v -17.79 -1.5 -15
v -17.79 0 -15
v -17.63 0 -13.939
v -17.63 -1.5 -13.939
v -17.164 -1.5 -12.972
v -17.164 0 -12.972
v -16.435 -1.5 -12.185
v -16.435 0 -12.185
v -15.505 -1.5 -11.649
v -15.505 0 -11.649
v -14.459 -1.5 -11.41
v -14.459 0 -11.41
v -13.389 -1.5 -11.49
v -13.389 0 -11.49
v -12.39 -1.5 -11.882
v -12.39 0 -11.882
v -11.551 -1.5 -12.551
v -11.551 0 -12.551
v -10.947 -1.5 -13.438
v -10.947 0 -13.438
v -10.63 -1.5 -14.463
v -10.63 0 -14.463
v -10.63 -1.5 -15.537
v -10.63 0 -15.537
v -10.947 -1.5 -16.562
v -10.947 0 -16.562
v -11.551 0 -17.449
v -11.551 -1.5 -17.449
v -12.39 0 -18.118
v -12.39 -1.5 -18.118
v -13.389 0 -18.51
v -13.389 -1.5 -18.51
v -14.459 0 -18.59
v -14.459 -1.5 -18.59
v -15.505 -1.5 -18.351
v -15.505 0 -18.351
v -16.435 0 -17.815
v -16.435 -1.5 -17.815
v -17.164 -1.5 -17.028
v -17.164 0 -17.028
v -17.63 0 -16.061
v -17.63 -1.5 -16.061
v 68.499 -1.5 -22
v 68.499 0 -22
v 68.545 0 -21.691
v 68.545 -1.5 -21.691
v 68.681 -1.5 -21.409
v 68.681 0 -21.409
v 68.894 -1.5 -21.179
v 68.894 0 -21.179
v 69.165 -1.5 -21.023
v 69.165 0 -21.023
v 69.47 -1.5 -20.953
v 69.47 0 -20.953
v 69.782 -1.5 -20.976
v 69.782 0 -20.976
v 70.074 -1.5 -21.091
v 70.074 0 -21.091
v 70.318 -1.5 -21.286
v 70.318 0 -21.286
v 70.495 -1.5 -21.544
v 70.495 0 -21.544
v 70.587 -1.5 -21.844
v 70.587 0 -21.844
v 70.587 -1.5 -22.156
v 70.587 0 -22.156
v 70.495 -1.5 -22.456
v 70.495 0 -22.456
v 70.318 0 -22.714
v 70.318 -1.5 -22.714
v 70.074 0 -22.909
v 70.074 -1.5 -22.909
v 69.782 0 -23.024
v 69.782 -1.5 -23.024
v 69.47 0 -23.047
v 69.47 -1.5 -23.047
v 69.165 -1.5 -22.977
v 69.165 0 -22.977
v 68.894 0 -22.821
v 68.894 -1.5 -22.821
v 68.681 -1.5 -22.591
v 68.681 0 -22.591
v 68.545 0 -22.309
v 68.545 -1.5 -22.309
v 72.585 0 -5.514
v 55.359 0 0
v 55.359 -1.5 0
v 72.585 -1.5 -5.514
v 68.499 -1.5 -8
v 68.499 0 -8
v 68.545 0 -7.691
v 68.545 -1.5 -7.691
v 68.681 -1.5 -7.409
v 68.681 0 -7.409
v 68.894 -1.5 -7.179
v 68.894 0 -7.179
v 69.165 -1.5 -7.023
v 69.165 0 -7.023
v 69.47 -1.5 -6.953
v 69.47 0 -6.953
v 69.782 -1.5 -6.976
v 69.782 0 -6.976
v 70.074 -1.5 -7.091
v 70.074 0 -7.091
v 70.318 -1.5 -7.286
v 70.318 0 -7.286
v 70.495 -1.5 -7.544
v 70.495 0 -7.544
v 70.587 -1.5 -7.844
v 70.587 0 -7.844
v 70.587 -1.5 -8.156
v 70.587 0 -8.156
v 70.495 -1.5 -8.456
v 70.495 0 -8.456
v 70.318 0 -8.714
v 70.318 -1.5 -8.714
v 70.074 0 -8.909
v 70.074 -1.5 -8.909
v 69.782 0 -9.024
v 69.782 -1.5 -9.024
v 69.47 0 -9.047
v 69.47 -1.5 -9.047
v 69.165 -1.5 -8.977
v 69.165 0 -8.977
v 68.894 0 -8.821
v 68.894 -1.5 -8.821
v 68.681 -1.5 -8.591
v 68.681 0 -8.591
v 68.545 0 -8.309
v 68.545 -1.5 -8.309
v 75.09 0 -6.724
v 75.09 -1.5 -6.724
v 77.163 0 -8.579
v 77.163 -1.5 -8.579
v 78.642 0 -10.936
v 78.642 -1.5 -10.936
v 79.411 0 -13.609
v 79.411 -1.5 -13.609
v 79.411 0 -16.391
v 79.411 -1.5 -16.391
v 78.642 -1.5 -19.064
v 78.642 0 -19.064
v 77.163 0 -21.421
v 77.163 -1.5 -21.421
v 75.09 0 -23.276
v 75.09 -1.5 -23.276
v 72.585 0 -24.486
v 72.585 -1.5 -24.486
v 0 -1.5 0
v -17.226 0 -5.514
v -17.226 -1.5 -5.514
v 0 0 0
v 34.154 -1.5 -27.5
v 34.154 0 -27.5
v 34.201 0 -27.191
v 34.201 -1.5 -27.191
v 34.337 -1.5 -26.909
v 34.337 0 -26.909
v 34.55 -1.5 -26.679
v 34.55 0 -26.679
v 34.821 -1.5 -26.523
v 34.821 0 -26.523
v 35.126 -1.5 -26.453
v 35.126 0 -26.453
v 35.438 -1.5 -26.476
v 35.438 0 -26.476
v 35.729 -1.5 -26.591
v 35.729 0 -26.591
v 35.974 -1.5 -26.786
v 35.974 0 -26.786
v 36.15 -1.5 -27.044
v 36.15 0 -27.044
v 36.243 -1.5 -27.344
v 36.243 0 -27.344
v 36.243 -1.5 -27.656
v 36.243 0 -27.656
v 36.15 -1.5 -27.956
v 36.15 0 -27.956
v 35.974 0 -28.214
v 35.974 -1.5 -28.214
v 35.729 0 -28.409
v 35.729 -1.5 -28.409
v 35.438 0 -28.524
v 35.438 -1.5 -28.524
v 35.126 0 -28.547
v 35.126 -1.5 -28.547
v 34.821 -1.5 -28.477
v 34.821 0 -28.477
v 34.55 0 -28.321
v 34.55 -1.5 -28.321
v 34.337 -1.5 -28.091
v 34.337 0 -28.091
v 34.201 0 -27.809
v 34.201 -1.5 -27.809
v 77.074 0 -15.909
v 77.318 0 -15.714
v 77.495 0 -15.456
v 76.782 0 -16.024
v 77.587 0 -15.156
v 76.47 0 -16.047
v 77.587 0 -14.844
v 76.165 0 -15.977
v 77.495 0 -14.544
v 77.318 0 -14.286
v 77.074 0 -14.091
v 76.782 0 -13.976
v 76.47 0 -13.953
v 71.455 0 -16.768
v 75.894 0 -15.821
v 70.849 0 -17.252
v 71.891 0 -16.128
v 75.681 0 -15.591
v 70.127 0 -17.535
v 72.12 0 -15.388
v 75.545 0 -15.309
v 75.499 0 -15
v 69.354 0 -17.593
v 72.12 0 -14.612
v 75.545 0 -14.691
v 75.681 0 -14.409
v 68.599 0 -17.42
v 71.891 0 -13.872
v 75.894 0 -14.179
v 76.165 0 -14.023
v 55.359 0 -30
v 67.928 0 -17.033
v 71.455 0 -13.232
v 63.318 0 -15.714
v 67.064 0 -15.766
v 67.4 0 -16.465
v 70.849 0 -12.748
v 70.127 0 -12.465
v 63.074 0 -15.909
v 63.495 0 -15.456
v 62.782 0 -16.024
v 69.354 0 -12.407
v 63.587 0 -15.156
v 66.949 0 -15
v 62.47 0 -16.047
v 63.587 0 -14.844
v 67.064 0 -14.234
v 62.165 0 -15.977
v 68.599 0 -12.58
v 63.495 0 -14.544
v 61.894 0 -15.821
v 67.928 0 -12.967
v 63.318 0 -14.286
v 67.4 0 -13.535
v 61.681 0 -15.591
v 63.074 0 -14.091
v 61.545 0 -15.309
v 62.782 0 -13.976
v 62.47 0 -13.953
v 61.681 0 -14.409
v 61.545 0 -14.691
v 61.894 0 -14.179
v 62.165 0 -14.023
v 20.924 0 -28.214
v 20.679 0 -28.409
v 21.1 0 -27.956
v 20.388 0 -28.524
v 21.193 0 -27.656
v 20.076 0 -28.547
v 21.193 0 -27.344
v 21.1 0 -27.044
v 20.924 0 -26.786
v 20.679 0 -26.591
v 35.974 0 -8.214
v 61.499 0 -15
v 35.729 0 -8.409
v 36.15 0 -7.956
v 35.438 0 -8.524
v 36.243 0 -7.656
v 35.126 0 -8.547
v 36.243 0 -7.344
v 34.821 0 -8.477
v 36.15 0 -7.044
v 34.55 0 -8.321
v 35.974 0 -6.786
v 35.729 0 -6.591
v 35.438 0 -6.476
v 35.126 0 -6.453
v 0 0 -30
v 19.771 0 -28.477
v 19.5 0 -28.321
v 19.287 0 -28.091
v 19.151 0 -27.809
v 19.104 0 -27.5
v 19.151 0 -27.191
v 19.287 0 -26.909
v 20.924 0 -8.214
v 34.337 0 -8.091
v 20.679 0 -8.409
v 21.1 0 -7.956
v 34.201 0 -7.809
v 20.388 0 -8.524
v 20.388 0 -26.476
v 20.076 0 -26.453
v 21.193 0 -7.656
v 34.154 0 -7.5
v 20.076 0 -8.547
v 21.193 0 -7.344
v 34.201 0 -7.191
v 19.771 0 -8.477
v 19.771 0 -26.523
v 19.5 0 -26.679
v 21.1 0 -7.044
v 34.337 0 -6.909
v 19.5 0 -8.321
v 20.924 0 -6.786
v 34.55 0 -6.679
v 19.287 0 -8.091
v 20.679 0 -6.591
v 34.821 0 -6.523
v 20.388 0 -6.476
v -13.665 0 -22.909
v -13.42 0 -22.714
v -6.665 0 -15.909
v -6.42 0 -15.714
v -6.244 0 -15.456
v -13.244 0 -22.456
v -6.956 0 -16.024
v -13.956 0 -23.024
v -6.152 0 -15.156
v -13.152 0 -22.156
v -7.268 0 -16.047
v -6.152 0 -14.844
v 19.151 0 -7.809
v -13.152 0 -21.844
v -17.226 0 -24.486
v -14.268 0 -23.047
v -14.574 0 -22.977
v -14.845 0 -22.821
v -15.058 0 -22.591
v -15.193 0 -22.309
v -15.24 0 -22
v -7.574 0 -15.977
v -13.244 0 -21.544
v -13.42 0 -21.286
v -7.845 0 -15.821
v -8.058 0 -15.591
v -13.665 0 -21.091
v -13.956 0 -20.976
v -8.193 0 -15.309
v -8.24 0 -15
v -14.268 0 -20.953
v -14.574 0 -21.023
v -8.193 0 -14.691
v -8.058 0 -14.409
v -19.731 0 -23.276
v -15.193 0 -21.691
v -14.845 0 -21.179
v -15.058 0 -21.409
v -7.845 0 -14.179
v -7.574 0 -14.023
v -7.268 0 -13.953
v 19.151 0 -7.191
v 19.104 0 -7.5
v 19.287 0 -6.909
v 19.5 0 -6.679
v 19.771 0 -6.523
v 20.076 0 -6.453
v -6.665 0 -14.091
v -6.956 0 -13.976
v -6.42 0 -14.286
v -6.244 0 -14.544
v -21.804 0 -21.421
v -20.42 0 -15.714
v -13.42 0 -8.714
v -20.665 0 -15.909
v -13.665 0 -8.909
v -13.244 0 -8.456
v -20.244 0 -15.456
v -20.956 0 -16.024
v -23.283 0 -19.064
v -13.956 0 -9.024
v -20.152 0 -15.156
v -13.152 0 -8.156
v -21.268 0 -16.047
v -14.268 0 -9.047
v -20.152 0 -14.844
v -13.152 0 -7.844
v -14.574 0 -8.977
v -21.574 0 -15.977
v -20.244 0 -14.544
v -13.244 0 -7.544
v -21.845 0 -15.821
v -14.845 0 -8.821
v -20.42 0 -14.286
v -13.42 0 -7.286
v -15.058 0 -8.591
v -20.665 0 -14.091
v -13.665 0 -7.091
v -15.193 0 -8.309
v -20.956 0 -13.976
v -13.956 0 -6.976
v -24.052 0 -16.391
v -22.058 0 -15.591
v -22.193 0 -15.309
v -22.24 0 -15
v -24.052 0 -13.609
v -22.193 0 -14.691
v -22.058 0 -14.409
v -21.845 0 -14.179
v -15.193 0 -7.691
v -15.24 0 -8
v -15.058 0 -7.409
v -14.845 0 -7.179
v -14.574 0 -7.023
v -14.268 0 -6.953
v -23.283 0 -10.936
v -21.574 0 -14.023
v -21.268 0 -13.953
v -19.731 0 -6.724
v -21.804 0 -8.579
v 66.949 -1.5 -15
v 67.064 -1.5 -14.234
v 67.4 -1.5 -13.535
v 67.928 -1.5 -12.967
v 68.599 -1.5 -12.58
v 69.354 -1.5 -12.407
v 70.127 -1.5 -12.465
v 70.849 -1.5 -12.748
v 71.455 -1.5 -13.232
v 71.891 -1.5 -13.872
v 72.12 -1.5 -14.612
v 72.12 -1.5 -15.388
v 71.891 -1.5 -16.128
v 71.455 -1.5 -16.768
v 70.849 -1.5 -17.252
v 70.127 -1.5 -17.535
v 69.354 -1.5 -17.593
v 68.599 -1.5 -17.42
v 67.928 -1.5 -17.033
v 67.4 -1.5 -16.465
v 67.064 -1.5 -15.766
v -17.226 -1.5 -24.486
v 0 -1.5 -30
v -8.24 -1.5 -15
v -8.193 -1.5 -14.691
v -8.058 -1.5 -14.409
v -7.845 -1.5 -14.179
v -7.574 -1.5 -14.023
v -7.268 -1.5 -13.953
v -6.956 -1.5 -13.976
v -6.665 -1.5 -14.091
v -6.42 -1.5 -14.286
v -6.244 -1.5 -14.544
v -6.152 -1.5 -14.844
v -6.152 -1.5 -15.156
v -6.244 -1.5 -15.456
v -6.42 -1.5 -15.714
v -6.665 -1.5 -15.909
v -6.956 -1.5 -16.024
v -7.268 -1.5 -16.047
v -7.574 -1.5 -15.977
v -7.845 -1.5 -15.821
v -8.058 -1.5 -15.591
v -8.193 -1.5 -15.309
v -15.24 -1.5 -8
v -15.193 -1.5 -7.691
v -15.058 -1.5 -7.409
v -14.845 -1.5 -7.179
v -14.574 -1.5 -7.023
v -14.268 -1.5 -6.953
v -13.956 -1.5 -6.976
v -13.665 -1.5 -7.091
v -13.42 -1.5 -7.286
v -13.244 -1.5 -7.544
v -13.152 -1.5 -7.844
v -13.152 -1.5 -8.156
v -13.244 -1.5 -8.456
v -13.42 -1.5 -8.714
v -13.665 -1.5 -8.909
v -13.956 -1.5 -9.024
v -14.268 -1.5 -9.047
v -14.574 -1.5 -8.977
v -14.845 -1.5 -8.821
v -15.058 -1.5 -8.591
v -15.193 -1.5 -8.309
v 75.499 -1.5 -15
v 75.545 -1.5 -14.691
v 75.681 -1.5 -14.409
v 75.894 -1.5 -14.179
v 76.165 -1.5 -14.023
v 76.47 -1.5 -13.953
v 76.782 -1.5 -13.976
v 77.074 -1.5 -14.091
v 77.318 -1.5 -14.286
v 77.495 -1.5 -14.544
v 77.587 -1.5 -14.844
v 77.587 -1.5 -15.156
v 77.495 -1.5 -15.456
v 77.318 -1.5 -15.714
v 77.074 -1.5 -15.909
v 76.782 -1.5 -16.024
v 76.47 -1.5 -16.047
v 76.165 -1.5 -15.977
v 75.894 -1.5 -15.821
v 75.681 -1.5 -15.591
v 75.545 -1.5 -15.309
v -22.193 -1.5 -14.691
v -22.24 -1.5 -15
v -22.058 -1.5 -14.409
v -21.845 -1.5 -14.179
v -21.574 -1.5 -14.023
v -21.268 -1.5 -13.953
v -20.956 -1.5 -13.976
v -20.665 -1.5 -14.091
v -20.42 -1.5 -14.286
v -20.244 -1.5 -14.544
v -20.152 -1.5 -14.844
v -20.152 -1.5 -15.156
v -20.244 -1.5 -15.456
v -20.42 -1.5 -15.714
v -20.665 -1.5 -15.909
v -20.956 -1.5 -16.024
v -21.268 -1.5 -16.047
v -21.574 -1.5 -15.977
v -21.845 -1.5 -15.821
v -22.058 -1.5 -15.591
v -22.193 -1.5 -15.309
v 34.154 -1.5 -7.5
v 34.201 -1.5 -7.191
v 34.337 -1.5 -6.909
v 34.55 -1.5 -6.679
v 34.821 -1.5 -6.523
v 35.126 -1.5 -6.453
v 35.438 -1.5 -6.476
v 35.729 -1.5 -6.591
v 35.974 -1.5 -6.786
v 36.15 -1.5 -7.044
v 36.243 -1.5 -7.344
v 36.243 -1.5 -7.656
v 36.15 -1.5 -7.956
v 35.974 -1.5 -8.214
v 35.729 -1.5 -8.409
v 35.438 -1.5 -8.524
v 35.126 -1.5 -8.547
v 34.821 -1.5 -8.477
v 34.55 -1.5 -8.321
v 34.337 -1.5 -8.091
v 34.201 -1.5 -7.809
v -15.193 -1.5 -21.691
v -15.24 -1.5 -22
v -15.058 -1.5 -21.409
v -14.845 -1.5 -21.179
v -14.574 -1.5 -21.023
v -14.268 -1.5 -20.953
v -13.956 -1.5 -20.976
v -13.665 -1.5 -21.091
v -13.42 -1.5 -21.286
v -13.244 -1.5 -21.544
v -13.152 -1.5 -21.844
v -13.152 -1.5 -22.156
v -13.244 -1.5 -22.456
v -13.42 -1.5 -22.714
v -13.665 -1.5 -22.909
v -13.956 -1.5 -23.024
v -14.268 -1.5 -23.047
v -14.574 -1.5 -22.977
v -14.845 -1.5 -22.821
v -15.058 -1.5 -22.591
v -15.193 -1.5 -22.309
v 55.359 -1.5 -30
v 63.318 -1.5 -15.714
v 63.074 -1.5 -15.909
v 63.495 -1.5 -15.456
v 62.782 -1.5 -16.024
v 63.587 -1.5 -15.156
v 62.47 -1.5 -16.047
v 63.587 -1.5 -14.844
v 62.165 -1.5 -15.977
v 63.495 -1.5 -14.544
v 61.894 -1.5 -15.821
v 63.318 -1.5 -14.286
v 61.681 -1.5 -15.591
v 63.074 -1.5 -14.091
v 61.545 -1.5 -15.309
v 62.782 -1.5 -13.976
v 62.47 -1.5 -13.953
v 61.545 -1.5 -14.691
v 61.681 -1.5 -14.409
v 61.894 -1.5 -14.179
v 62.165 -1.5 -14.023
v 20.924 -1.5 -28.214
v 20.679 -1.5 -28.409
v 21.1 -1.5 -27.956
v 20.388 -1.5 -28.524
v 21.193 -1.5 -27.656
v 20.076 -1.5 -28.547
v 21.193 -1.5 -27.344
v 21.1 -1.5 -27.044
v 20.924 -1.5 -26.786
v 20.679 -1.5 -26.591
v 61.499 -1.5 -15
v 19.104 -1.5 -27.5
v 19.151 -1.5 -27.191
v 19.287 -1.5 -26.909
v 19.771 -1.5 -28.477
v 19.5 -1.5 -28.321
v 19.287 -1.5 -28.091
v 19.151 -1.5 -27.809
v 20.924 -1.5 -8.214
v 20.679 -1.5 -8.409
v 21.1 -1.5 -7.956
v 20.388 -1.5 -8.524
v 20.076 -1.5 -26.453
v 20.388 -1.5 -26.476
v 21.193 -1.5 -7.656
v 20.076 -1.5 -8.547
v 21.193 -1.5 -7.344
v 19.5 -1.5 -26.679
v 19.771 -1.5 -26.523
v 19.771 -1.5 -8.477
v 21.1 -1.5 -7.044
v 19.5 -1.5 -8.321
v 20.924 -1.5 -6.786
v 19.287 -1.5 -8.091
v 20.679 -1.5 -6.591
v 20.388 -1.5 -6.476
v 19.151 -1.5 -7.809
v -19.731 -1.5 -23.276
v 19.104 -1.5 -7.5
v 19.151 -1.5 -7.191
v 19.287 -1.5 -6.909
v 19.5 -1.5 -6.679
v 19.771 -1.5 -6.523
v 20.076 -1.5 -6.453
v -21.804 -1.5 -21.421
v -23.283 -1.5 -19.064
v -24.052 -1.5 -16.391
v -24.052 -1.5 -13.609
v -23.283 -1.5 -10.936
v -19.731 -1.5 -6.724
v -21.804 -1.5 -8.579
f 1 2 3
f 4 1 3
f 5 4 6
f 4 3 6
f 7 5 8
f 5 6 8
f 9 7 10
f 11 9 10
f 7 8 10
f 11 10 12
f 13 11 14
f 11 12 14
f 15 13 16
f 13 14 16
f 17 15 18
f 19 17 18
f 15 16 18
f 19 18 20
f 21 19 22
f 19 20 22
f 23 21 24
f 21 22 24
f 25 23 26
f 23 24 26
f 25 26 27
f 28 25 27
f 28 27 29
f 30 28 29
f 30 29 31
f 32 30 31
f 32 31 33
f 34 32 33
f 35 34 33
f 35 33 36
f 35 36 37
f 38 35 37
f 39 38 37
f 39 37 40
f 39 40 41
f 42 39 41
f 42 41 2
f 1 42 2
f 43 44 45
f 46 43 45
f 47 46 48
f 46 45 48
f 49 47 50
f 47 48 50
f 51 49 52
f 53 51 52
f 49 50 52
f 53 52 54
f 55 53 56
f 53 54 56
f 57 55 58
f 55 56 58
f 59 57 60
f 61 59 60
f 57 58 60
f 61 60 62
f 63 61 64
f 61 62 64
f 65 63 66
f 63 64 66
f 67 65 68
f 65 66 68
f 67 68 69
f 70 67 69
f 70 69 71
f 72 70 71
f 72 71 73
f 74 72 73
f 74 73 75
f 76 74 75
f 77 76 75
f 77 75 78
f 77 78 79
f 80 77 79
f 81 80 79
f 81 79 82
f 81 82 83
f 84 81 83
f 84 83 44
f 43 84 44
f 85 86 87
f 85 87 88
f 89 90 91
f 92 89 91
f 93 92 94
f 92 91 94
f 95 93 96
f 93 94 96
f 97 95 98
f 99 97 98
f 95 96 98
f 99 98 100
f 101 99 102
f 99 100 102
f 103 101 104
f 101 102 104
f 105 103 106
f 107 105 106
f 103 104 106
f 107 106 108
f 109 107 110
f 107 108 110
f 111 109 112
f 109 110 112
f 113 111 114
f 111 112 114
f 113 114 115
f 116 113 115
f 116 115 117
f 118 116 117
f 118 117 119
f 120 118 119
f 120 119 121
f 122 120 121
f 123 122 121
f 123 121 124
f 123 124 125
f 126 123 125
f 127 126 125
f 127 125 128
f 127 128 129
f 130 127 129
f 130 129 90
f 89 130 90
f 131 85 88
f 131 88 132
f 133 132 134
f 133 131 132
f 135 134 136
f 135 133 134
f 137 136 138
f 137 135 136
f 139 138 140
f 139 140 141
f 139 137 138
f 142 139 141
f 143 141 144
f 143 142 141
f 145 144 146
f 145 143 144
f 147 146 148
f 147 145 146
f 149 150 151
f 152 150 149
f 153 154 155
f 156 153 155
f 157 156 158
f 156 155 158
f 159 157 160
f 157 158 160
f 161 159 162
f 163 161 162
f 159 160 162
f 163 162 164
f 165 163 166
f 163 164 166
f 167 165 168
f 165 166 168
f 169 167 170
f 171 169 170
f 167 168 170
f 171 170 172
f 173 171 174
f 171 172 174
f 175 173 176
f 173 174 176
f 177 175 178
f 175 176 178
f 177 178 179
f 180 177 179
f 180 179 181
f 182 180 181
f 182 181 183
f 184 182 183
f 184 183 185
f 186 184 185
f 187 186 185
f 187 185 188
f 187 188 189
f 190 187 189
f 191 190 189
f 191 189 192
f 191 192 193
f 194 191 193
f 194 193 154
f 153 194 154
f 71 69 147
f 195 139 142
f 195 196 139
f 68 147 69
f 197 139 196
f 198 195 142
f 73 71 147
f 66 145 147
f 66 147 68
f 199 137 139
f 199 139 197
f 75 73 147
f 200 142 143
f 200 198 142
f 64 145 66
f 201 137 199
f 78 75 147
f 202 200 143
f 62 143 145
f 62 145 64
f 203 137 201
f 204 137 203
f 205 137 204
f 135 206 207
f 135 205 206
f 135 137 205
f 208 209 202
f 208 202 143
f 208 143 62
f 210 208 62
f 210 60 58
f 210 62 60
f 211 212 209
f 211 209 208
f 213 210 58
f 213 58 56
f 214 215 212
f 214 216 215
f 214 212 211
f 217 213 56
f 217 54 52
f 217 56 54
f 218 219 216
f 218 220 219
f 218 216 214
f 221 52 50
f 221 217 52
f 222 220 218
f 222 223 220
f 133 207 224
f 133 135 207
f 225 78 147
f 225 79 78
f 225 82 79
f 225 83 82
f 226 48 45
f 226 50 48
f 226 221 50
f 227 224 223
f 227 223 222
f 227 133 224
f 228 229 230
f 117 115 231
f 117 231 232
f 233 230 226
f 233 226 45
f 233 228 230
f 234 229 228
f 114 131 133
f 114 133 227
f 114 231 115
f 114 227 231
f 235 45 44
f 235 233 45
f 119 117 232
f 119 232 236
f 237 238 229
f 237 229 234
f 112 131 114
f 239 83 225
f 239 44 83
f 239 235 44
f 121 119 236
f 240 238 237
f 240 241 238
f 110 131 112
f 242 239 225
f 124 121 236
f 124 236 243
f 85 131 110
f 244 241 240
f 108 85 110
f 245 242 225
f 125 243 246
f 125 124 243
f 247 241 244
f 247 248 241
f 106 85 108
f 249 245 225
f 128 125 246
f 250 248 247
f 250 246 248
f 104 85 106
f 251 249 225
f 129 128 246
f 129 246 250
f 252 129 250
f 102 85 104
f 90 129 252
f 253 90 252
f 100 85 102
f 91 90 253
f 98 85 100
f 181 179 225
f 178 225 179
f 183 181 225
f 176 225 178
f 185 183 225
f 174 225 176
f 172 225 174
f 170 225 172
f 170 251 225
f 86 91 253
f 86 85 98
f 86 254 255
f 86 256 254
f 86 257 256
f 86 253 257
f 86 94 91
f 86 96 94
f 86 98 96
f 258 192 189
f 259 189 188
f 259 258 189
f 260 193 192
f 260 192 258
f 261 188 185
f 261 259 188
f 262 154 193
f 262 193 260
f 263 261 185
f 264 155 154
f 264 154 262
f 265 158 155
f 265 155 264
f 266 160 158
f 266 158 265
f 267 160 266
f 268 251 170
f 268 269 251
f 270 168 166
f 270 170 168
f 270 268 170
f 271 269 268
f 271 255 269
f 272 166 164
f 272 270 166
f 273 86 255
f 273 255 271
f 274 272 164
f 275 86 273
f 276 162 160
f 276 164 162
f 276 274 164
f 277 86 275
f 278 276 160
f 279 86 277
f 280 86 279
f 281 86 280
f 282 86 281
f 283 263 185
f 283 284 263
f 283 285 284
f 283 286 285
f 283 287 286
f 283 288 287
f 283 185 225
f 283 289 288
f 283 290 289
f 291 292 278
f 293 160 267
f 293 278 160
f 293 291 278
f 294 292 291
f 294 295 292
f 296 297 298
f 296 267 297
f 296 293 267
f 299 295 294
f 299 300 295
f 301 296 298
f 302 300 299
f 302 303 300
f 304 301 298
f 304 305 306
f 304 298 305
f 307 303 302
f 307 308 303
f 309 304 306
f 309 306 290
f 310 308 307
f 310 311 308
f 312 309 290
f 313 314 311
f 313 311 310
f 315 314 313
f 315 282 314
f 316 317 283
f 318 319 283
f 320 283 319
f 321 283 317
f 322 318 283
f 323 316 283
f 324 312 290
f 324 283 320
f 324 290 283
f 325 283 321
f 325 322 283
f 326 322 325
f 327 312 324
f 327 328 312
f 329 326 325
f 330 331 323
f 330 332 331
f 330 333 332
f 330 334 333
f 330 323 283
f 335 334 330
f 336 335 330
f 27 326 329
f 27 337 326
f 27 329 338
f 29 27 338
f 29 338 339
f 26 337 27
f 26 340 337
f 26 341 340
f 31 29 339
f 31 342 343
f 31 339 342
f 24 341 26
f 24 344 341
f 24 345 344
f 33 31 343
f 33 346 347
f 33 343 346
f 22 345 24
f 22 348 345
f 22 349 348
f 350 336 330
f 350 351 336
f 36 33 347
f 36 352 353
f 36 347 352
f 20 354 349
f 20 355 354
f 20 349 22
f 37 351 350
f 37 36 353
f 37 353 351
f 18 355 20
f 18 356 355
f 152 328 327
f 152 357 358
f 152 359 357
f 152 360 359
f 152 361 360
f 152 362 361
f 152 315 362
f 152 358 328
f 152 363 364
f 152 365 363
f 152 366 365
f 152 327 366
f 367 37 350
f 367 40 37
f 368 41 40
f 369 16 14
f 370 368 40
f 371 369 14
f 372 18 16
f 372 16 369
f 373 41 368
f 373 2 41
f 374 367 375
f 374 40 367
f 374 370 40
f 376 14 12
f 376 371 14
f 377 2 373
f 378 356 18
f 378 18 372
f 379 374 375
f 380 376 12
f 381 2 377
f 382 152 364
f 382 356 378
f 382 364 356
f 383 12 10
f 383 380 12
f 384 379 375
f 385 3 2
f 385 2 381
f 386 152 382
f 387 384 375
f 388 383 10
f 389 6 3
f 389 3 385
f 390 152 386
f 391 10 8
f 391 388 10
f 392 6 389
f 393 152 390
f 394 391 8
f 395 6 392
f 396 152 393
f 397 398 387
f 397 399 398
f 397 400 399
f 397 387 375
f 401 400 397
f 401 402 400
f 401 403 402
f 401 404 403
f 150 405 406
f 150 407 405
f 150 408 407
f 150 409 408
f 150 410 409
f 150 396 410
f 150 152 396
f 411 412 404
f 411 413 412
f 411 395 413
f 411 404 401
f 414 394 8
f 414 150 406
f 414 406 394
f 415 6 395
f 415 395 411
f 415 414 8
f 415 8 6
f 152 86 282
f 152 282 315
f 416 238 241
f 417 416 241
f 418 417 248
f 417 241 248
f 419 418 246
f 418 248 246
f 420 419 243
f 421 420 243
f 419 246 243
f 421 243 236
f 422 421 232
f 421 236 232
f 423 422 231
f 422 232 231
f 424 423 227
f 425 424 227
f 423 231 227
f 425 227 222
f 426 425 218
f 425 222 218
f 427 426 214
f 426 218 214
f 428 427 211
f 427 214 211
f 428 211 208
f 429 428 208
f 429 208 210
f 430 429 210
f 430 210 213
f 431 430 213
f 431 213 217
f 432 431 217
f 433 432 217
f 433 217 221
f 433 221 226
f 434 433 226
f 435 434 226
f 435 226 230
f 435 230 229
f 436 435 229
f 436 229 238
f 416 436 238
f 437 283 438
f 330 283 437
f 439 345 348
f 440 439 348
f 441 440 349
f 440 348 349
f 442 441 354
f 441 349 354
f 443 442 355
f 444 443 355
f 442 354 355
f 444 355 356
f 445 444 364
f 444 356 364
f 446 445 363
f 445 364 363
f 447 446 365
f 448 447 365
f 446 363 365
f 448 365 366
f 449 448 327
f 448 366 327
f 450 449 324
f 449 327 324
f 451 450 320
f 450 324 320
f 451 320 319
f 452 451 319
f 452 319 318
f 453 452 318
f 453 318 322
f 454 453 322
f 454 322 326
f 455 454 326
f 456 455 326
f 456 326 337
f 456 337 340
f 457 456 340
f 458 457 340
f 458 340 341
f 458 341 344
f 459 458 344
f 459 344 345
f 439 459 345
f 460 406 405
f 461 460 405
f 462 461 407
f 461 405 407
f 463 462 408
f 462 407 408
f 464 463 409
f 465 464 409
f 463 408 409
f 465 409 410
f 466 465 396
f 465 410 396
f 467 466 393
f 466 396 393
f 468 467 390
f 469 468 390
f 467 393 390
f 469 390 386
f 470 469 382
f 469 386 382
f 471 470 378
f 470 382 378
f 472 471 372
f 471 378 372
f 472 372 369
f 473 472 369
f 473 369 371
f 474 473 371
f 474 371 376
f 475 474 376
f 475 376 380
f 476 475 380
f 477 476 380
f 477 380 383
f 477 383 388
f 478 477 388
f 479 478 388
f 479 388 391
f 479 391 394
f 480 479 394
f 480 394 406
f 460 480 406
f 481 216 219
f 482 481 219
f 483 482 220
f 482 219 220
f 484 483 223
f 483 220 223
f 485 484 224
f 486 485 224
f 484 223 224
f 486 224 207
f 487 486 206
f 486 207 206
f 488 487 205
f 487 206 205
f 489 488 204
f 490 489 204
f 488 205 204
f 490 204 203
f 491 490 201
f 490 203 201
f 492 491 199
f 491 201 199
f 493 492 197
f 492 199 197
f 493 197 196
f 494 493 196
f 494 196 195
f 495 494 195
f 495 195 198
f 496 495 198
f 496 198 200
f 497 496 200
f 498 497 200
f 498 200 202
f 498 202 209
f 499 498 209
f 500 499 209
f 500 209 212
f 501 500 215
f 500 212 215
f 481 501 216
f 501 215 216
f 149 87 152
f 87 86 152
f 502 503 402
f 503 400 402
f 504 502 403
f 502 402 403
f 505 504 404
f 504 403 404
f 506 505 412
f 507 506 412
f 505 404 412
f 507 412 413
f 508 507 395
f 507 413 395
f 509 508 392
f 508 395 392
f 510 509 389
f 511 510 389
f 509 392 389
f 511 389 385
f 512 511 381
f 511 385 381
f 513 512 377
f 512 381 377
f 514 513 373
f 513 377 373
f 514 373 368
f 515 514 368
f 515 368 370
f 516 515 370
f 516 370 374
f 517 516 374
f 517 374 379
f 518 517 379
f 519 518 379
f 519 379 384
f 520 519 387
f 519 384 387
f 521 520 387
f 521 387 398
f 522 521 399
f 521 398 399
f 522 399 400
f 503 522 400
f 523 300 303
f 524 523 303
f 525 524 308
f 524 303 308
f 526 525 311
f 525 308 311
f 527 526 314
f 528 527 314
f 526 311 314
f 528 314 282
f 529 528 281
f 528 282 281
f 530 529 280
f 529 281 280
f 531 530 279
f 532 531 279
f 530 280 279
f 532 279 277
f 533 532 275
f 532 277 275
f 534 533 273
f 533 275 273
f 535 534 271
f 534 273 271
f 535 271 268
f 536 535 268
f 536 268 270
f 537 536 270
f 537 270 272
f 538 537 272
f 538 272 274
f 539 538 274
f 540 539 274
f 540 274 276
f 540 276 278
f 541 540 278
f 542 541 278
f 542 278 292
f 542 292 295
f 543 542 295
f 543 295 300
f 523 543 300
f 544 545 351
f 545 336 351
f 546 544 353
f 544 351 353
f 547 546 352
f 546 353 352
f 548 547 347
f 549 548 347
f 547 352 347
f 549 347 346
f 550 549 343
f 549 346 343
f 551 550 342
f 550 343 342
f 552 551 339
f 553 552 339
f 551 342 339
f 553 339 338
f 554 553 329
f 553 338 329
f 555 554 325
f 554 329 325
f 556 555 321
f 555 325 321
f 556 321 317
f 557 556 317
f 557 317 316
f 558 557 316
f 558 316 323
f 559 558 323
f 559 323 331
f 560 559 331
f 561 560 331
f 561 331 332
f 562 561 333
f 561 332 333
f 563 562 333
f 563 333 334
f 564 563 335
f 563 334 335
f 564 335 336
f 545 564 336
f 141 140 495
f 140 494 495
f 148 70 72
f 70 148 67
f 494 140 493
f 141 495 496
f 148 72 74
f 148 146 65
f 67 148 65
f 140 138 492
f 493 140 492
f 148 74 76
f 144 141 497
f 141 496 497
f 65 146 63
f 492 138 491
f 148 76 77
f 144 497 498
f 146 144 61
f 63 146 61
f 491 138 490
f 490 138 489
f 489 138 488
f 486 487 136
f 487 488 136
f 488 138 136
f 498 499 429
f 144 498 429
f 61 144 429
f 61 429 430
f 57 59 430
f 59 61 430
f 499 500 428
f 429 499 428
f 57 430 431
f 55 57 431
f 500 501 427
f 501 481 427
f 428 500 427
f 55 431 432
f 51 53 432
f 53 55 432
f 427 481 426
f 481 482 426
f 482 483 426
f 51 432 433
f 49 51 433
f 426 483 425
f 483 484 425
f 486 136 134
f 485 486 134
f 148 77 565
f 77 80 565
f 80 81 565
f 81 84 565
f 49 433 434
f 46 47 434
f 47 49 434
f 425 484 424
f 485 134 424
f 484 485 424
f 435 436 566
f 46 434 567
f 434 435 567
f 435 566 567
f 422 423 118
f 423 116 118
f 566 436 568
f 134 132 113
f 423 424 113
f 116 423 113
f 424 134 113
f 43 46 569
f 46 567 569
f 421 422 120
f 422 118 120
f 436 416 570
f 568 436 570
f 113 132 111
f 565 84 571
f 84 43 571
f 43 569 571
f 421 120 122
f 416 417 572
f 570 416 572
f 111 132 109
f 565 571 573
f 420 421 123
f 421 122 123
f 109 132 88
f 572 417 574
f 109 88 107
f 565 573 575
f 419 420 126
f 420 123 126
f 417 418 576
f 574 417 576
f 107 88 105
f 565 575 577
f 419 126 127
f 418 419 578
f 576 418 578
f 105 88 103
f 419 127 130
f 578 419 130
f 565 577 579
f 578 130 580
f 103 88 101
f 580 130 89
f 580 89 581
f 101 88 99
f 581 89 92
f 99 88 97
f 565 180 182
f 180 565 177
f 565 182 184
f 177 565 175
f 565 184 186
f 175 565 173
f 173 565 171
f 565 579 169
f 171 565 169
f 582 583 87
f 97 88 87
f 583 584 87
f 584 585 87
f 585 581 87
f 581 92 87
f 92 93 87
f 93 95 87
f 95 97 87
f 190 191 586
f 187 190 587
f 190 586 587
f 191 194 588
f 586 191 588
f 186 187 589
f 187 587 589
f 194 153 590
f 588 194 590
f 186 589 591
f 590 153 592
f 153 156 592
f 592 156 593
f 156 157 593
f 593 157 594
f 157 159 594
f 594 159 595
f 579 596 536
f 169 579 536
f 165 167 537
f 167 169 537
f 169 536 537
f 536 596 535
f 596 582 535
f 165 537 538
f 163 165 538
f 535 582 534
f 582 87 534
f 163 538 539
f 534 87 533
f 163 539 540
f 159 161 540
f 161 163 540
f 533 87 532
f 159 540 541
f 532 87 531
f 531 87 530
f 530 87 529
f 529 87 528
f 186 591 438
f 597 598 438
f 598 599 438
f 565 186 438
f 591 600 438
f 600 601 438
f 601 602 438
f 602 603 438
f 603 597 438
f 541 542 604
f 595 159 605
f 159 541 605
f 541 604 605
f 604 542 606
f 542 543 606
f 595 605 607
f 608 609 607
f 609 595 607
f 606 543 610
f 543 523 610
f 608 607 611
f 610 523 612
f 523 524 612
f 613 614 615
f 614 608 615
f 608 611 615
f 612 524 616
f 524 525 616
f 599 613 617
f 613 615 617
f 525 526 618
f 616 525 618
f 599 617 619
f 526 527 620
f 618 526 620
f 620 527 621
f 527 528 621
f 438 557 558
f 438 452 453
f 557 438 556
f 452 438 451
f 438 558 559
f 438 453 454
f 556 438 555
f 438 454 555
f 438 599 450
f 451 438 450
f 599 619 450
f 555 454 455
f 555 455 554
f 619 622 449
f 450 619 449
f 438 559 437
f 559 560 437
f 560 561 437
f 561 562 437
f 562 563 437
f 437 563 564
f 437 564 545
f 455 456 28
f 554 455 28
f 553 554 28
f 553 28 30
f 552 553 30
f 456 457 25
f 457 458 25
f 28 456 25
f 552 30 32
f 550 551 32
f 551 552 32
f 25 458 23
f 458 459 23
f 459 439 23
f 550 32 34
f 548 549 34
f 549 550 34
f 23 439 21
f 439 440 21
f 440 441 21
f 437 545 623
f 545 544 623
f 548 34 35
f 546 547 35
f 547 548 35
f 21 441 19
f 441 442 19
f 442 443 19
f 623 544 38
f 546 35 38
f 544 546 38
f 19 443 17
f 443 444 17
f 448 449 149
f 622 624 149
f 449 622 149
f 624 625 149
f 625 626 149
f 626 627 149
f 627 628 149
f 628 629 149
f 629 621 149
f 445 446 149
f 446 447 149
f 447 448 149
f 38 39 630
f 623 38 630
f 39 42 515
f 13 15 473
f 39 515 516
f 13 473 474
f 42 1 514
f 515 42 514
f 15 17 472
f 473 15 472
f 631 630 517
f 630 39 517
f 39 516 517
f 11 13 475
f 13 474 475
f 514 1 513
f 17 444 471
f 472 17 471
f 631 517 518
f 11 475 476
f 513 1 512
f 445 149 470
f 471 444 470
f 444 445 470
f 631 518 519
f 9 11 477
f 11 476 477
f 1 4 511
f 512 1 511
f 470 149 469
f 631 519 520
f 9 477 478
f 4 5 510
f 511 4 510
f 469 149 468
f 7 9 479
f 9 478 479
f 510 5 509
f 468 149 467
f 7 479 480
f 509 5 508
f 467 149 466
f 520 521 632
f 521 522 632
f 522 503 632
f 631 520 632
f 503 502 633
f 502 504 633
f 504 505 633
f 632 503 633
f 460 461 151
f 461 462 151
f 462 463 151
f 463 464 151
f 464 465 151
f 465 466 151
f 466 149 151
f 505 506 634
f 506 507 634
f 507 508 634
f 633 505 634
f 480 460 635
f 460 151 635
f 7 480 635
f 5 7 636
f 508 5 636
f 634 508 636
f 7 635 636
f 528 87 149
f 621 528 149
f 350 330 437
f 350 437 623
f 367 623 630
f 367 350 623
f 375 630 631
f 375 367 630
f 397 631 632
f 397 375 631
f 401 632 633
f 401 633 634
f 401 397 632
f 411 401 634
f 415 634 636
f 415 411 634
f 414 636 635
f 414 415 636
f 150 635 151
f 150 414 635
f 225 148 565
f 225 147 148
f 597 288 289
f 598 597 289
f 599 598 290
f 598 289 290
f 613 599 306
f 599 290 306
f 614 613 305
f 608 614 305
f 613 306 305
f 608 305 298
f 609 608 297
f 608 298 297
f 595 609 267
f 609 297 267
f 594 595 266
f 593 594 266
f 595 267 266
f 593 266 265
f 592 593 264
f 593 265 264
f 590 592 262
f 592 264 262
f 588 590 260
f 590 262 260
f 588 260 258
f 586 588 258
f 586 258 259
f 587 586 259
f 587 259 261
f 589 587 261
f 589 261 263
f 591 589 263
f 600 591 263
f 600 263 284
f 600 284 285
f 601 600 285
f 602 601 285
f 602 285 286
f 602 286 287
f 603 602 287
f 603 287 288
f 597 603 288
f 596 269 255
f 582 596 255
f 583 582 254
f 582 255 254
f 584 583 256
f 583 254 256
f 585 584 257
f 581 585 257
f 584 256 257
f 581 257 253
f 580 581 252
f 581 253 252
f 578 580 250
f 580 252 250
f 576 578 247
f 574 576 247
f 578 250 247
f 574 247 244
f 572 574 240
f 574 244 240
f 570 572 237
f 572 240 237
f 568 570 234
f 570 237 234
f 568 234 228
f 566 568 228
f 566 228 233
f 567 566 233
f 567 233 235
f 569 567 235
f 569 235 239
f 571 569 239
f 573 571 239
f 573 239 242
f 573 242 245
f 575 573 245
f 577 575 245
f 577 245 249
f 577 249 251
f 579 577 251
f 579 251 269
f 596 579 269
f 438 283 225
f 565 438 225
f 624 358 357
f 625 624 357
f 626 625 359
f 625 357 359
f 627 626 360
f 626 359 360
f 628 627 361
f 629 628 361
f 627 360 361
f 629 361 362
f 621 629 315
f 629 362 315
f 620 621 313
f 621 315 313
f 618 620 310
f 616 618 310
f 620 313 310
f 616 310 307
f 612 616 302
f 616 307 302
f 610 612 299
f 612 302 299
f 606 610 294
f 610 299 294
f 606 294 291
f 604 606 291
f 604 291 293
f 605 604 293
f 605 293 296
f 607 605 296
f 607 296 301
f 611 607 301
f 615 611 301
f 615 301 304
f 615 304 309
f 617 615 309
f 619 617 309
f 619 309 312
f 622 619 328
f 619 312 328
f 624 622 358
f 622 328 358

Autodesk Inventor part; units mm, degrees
ref_plane "YZ Plane" through (0, 0, 0) normal (1, 0, 0) x (0, 1, 0)
ref_plane "XZ Plane" through (0, 0, 0) normal (0, 1, 0) x (-1, 0, 0)
ref_plane "XY Plane" through (0, 0, 0) normal (0, 0, 1) x (1, 0, 0)
sketch "Sketch1" plane through (0, 0, 0) normal (0, 1, 0) x (-1, 0, 0)
  line L0 (-0.4496, -30) -> (-0.4496, 0)
  line L1 (-54.9089, 0) -> (-54.9089, -30)
  circle A0 centre (-20.1543, -27.5) radius 1.05
  circle A1 centre (-20.1543, -7.5) radius 1.05
  circle A2 centre (-35.2043, -27.5) radius 1.05
  circle A3 centre (-35.2043, -7.5) radius 1.05
  circle A4 centre (-69.5486, -15) radius 2.6
  circle A5 centre (14.19, -15) radius 3.6
  circle A6 centre (7.19, -15) radius 1.05
  circle A7 centre (14.19, -22) radius 1.05
  circle A8 centre (21.19, -15) radius 1.05
  circle A9 centre (14.19, -8) radius 1.05
  circle A10 centre (-69.5486, -22) radius 1.05
  circle A11 centre (-62.5486, -15) radius 1.05
  circle A12 centre (-69.5486, -8) radius 1.05
  circle A13 centre (-76.5486, -15) radius 1.05
  line L2 (-72.585, -24.4859) -> (-55.3586, -30)
  line L3 (0, -30) -> (17.2264, -24.4859)
  arc A14 (-72.585, -5.5141) -> (-72.585, -24.4859) centre (-69.5486, -15) ccw
  arc A15 (17.2264, -24.4859) -> (17.2264, -5.5141) centre (14.19, -15) ccw
  line L4 (-55.3586, 0) -> (-72.585, -5.5141)
  line L5 (17.2264, -5.5141) -> (0, 0)
  line L6 (-55.3586, 0) -> (0, 0)
  line L7 (0, -30) -> (-55.3586, -30)
  line L8 (-55.3586, -30) -> (-55.3586, 0)
  line L9 (-54.4593, 0) -> (-54.4593, -30)
  line L10 (-0.8993, -30) -> (-0.8993, 0)
  line L11 (0, 0) -> (0, -30)
extrude "Extrusion1" add sketch "Sketch1" against normal blind 1.5
sketch "Sketch2" plane through (0, 0, 0) normal (0, 1, 0) x (1, 0, 0)
  line L0 (0, 0) -> (0, 30) projected
  line L1 (0.4496, 30) -> (0.4496, 0) projected
  line L2 (0.8993, 30) -> (0.8993, 0) projected
  line L3 (54.4593, 0) -> (54.4593, 30) projected
  line L4 (54.9089, 0) -> (54.9089, 30) projected
  line L5 (55.3586, 30) -> (55.3586, 0) projected
properties part number "axis_14_bottom_frame"
